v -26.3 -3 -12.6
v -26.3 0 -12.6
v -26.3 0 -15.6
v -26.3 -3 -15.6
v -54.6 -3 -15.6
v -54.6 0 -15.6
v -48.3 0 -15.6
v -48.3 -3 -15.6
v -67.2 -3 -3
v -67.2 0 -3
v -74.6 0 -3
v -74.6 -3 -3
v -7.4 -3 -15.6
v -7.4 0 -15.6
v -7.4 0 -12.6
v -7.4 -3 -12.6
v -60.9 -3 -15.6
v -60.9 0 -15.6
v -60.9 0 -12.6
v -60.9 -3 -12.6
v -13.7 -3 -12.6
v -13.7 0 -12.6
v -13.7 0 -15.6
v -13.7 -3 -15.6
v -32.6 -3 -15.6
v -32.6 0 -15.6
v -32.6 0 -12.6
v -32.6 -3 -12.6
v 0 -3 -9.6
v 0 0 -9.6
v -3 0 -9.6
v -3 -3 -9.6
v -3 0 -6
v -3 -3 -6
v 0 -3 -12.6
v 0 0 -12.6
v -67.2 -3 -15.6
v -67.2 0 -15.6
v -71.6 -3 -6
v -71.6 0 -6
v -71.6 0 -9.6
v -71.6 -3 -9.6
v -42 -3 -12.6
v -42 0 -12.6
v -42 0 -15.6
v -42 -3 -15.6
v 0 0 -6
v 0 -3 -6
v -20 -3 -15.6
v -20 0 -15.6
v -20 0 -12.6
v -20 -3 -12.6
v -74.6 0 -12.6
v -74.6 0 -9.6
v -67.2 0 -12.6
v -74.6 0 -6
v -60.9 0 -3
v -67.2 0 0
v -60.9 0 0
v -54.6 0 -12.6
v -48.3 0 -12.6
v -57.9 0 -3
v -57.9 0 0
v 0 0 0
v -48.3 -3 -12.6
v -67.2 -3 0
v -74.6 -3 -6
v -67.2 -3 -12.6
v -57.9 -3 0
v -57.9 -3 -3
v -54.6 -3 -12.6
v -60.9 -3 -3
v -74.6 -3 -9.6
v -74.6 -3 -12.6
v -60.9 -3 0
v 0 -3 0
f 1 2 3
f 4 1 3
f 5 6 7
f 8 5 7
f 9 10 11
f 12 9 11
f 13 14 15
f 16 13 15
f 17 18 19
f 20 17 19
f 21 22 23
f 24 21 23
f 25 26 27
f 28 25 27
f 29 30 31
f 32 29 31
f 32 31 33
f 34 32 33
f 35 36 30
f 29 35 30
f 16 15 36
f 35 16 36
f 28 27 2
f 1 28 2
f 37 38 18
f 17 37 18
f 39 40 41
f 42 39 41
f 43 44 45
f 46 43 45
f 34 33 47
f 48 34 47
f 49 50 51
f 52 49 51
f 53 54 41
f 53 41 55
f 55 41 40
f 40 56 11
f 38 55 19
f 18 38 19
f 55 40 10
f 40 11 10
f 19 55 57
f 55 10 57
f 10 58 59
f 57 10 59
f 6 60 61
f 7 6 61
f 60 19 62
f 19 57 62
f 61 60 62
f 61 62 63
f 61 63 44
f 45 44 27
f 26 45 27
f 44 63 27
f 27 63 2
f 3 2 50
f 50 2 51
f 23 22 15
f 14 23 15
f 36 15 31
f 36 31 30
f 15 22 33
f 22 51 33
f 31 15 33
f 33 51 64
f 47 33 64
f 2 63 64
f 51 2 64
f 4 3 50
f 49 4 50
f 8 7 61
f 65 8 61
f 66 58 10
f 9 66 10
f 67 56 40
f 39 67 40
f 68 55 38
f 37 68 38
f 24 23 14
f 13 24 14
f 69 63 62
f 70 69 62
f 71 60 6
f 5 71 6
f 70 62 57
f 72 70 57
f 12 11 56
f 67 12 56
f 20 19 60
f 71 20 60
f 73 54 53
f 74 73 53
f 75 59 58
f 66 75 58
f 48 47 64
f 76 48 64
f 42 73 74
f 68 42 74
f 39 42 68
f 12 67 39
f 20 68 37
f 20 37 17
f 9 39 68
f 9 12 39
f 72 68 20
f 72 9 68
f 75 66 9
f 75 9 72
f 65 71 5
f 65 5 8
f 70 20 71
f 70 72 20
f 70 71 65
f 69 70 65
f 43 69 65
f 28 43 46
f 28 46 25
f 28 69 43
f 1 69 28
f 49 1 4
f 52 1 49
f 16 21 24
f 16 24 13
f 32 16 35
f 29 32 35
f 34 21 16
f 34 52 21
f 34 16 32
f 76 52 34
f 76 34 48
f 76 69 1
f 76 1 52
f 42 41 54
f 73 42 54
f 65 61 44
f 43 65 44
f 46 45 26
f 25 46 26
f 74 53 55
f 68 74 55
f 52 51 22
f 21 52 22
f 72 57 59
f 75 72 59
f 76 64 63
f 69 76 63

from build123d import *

# Parameters (mm, degrees)
F1_DEPTH = 3


with BuildPart() as f1:
    # F0 (on Front) → F1 (new body)
    with BuildSketch(Plane.XZ):
        Polygon((-32.600003, -15.6), (-32.600003, -12.6), (-26.300003, -12.6), (-26.300003, -15.6), (-20.000003, -15.6), (-20.000003, -12.6), (-13.700003, -12.6), (-13.700003, -15.6), (-7.400003, -15.6), (-7.400003, -12.6), (-3e-06, -12.6), (-3e-06, -9.6), (-3.000003, -9.6), (-3.000003, -6), (-3e-06, -6), (-3e-06, 0), (-57.900003, 0), (-57.900003, -3), (-60.900003, -3), (-60.900003, 0), (-67.200003, 0), (-67.200003, -3), (-74.600003, -3), (-74.600003, -6), (-71.600003, -6), (-71.600003, -9.6), (-74.600003, -9.6), (-74.600003, -12.6), (-67.200003, -12.6), (-67.200003, -15.6), (-60.900003, -15.6), (-60.900003, -12.6), (-54.600003, -12.6), (-54.600003, -15.6), (-48.300003, -15.6), (-48.300003, -12.6), (-42.000003, -12.6), (-42.000003, -15.6), align=None)
    extrude(amount=F1_DEPTH)


solid = f1.part
